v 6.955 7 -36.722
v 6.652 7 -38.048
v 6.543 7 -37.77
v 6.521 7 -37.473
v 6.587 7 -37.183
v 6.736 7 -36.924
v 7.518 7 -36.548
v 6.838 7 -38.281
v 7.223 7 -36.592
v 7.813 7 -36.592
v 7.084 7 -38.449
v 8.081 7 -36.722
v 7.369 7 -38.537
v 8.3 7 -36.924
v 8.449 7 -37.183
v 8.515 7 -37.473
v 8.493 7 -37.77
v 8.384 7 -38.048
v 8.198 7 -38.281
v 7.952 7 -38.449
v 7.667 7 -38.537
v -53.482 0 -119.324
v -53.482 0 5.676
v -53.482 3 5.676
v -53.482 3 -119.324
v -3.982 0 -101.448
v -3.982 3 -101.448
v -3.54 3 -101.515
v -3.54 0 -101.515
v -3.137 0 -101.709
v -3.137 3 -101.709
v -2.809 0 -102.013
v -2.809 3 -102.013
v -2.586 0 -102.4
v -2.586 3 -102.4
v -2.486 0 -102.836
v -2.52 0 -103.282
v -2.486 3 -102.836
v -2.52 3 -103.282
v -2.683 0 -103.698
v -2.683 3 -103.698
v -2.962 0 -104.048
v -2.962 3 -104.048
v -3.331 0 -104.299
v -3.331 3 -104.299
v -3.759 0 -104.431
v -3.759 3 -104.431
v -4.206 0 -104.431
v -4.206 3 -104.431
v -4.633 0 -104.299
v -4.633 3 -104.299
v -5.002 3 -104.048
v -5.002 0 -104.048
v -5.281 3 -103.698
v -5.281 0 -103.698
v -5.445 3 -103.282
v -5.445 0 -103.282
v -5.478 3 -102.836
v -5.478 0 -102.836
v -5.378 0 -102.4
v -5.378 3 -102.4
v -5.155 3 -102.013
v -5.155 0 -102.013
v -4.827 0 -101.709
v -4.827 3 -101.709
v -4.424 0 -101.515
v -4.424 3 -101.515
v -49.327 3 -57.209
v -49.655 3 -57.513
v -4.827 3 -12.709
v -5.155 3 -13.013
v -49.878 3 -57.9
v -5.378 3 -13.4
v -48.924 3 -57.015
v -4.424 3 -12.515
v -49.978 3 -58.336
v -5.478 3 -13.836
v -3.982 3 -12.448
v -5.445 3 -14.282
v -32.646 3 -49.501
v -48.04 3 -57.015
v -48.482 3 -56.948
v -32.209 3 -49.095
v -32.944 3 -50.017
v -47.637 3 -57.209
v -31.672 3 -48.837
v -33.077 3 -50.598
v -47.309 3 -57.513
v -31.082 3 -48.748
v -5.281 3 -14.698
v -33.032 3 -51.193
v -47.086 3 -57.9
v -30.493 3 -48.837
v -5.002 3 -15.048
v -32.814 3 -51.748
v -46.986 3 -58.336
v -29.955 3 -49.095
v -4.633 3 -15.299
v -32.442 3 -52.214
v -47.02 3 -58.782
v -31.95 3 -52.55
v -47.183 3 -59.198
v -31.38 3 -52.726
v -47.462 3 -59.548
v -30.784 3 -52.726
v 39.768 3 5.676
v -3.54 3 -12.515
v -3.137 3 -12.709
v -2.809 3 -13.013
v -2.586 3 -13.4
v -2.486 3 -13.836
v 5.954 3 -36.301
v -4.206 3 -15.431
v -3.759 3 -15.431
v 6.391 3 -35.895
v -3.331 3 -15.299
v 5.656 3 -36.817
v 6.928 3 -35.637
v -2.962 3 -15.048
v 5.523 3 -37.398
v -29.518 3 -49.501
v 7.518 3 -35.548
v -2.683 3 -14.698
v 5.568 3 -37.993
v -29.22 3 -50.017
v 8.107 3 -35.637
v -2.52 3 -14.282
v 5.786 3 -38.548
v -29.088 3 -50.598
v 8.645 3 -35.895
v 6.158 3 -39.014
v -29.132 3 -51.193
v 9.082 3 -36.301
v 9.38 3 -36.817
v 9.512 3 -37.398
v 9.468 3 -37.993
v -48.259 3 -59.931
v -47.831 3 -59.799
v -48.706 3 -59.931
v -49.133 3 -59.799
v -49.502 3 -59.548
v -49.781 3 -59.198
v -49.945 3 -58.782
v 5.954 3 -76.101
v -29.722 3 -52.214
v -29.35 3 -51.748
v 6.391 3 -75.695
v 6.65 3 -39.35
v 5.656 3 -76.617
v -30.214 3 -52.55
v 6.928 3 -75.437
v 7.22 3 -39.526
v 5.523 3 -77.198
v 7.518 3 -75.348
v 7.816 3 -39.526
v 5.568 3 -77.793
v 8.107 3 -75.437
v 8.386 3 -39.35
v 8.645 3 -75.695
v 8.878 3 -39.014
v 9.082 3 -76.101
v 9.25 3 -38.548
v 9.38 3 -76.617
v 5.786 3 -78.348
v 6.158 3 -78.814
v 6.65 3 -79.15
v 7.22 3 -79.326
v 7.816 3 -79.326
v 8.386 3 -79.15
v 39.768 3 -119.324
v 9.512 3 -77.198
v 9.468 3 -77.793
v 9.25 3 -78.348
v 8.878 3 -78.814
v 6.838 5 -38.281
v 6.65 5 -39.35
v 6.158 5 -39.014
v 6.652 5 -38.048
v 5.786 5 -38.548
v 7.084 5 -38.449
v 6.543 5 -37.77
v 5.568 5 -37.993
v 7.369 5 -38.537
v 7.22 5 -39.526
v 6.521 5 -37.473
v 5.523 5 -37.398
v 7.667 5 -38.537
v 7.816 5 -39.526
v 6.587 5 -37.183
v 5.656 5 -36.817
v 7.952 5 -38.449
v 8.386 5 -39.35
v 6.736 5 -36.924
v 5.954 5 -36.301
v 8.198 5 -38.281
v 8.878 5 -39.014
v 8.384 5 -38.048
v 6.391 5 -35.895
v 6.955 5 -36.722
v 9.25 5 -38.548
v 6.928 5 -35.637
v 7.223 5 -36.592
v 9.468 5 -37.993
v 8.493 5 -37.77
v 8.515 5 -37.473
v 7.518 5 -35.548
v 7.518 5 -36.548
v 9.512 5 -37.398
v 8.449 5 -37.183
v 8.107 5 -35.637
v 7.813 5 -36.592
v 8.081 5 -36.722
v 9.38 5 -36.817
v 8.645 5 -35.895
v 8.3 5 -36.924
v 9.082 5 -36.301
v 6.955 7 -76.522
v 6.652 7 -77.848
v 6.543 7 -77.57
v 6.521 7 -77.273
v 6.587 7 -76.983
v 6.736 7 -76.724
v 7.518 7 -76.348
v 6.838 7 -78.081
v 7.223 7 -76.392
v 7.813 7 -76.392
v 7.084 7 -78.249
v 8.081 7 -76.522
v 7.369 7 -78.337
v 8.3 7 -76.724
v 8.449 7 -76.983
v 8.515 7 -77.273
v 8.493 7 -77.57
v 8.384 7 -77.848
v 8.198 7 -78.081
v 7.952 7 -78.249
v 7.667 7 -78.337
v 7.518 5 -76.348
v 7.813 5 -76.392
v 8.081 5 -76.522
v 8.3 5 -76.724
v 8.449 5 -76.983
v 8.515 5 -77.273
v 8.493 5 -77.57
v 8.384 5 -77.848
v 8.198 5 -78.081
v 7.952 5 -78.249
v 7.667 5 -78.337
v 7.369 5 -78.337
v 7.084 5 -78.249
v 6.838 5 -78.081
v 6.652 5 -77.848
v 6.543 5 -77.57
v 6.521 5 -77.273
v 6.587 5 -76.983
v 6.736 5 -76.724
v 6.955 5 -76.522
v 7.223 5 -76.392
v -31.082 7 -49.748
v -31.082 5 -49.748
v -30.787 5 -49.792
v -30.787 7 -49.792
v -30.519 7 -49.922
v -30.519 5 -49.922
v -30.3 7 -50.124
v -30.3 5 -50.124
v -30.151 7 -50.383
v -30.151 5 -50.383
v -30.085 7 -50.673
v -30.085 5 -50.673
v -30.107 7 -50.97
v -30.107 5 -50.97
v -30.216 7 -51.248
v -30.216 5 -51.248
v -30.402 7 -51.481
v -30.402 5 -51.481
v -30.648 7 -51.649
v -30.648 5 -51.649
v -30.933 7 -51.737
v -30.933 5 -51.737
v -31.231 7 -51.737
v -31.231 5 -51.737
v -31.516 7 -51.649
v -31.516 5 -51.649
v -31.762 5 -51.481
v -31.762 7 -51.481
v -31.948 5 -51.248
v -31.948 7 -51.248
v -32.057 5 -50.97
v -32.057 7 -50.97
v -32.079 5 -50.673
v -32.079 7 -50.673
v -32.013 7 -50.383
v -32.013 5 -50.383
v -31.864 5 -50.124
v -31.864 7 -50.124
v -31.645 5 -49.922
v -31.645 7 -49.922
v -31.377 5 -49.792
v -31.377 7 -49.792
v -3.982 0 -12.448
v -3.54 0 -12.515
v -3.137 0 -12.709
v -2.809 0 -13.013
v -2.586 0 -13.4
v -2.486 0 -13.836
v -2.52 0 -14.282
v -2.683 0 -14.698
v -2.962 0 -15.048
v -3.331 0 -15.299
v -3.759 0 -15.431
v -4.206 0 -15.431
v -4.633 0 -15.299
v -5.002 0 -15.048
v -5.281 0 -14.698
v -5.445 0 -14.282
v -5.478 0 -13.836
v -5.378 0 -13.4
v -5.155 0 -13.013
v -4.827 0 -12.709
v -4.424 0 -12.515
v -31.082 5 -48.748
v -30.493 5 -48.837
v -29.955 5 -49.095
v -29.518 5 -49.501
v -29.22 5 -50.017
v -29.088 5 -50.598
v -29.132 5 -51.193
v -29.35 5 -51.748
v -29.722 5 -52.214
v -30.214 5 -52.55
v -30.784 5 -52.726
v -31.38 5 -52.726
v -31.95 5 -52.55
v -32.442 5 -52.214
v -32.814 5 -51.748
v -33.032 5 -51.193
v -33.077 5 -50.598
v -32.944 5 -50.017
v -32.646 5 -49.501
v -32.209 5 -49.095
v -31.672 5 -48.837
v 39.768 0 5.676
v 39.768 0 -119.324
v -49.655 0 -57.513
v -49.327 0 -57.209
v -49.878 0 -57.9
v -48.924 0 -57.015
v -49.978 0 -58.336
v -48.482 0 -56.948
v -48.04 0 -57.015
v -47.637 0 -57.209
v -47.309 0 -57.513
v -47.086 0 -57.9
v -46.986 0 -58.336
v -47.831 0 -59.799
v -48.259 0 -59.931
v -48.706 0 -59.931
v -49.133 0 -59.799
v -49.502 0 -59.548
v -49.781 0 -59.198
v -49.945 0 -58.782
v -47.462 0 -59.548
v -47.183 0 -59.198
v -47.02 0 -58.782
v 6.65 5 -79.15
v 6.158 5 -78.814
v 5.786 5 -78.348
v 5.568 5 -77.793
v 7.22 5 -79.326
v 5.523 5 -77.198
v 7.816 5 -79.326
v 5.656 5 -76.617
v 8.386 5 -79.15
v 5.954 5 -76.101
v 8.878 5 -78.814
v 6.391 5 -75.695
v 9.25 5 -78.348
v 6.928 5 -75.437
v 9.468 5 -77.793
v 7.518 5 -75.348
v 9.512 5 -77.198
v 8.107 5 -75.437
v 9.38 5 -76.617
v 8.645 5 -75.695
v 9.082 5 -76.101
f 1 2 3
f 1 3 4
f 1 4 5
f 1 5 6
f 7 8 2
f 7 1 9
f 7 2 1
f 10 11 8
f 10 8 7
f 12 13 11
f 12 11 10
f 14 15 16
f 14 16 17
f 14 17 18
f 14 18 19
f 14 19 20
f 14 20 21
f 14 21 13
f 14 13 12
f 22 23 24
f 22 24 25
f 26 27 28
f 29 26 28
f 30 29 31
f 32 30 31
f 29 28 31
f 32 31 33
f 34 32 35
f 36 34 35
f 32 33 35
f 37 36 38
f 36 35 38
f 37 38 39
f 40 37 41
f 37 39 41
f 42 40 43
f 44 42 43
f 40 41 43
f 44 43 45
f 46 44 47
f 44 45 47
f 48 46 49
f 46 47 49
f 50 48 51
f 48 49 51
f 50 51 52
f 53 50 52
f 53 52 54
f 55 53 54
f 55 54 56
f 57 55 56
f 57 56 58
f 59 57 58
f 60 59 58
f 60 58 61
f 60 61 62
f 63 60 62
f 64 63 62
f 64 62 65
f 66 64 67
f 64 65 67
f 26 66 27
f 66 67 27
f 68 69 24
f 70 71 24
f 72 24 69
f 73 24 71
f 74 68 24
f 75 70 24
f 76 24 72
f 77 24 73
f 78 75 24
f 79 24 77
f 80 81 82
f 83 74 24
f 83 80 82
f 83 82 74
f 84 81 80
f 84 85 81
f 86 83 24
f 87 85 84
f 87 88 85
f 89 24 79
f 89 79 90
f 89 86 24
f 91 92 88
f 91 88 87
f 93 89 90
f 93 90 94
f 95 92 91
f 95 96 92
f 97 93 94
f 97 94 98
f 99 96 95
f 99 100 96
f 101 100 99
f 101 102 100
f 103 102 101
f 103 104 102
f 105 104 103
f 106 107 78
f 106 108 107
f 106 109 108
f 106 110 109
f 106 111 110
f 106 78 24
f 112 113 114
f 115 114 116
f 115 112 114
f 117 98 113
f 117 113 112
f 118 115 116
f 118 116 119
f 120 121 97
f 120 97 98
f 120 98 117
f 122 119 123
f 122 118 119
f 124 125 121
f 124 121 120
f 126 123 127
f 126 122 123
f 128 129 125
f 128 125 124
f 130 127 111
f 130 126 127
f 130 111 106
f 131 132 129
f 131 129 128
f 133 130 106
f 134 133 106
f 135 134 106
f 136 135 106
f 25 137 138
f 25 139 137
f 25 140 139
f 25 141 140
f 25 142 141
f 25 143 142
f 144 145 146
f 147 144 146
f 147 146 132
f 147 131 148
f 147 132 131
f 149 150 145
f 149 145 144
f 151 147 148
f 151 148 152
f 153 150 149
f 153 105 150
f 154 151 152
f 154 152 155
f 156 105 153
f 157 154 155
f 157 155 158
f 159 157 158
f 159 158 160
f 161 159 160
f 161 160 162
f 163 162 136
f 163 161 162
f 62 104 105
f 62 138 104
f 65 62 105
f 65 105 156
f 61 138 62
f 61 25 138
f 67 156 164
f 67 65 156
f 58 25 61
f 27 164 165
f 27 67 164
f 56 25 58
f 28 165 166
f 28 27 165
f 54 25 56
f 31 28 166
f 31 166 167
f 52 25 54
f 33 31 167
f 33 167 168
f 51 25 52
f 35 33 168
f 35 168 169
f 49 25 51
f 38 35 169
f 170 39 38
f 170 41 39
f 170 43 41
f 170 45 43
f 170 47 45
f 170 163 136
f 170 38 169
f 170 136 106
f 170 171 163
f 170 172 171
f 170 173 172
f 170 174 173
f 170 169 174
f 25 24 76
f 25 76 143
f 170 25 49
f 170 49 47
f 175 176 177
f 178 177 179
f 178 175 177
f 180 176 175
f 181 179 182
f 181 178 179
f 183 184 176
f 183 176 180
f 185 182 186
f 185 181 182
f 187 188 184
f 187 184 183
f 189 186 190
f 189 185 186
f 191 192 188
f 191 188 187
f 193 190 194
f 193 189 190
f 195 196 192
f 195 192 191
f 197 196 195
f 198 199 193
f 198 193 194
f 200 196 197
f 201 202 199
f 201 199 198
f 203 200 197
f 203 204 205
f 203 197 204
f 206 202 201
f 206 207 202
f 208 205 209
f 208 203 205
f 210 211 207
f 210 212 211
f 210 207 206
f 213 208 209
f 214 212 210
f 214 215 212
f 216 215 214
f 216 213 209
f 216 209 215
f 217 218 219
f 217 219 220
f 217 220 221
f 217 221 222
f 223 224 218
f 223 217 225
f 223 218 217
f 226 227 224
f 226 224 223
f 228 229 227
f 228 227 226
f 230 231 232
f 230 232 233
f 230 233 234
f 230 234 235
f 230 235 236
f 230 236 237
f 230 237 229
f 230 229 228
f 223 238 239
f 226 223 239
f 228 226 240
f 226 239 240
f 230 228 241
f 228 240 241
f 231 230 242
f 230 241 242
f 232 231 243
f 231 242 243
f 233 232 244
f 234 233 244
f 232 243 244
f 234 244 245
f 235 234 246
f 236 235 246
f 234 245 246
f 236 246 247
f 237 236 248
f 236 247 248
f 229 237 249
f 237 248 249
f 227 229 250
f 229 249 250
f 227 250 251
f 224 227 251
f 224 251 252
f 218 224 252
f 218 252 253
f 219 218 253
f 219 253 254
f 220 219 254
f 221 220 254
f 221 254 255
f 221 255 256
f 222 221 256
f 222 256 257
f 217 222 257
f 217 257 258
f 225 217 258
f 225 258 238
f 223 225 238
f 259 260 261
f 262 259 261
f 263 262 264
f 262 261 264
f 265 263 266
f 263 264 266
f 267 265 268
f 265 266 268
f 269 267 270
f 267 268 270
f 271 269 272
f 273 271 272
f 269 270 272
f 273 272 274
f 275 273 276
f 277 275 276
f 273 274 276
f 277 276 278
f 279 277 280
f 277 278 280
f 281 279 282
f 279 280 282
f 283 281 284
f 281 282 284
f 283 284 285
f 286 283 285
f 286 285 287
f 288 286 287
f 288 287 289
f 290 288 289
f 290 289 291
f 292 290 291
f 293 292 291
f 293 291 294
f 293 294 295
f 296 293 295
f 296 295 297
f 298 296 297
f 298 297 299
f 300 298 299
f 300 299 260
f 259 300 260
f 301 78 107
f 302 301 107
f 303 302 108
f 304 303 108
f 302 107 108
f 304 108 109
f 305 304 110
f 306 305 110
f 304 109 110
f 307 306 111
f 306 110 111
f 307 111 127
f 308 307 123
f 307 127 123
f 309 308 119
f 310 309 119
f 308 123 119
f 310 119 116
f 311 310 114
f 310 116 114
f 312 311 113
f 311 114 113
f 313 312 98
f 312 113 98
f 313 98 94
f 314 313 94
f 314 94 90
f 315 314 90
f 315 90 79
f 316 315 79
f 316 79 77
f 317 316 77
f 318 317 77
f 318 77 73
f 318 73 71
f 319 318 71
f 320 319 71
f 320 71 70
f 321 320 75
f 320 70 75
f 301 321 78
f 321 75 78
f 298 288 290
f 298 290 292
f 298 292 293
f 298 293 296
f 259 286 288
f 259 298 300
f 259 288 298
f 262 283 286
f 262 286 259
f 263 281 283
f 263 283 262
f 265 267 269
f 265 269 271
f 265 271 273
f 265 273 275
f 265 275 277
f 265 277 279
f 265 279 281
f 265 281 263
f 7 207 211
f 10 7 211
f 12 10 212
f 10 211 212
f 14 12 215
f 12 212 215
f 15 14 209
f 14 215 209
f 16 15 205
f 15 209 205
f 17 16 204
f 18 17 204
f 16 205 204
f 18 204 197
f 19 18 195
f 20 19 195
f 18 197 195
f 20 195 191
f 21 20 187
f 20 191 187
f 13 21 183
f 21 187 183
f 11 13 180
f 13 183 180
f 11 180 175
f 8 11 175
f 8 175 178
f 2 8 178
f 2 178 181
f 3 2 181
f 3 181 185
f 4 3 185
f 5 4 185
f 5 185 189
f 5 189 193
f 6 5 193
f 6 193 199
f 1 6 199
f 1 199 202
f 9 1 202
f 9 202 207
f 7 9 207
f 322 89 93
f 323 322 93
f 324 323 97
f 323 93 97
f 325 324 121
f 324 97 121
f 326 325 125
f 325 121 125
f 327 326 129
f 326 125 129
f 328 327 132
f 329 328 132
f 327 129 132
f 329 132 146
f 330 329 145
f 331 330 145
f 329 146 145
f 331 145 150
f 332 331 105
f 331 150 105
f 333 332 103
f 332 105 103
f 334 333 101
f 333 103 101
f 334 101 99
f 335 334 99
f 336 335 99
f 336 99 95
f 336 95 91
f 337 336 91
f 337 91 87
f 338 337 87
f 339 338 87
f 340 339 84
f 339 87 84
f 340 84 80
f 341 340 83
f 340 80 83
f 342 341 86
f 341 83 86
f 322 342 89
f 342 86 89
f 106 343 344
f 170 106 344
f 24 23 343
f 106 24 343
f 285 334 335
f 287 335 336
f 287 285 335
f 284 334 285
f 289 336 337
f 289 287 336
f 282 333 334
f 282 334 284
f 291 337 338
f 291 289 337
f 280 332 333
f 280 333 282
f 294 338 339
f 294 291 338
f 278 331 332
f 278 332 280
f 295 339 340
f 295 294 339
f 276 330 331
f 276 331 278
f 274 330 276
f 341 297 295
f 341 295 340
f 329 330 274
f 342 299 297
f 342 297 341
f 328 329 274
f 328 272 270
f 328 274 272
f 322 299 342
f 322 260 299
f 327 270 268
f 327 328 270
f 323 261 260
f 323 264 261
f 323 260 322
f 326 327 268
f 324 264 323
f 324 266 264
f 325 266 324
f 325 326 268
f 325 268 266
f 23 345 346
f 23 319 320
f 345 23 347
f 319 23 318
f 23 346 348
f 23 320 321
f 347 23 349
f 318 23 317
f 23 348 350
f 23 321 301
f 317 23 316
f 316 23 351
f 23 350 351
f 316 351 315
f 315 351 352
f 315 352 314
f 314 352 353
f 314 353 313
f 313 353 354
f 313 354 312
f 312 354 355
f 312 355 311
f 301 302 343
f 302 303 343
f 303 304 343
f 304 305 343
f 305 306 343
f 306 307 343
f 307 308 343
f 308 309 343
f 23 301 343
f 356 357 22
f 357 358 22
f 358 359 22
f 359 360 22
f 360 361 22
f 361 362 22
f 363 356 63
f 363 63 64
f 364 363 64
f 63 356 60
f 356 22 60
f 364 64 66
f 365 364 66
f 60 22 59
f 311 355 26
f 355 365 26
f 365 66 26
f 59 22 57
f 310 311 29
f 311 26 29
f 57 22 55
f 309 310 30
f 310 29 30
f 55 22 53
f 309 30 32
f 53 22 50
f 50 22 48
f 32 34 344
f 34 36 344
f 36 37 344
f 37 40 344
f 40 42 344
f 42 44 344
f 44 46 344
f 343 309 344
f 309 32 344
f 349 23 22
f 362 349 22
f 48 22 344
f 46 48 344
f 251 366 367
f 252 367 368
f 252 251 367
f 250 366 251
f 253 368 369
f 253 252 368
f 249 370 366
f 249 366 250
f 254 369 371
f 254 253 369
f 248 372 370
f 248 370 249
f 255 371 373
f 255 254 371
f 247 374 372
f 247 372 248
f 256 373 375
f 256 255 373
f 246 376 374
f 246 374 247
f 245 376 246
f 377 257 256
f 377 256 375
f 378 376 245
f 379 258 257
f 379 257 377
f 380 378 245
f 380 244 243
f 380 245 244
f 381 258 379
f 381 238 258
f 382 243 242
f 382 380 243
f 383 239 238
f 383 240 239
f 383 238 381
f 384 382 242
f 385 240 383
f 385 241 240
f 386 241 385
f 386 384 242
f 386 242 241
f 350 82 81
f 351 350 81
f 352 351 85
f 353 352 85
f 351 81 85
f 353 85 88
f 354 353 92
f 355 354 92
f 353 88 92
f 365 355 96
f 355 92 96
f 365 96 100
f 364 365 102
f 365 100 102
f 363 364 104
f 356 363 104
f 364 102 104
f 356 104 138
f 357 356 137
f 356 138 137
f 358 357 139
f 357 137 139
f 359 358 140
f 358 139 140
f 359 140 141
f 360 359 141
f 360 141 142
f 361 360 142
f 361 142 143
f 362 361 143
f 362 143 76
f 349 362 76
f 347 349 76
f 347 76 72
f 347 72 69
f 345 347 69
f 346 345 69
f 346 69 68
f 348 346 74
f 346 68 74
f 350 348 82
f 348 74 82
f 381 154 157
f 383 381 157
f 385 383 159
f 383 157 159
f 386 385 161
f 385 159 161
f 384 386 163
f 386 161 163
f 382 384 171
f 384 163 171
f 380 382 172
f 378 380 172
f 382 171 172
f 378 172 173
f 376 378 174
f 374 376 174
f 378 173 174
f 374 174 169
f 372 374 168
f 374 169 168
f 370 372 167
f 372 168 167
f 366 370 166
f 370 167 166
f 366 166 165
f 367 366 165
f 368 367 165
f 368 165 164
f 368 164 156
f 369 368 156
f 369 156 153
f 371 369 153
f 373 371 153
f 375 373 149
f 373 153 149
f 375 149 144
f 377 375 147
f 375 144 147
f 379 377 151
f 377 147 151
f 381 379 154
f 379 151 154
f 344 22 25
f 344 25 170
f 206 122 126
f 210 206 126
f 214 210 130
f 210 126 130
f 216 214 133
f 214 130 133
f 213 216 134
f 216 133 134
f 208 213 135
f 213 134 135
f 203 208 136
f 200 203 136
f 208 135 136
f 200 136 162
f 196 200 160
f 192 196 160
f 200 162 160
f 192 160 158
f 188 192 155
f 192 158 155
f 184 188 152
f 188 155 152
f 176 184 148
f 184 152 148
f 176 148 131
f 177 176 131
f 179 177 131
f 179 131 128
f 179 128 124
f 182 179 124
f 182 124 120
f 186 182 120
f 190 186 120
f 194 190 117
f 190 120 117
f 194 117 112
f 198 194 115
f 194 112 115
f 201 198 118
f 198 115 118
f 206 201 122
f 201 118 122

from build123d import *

# Parameters (mm, degrees)
SKETCH1_W           = 93.25
SKETCH1_H           = 125
BOSS_EXTRUDE1_DEPTH = 3
SKETCH3_R           = 1.5
CUT_EXTRUDE1_DEPTH  = 3
SKETCH4_R           = 2
SKETCH4_R_2         = 1
BOSS_EXTRUDE2_DEPTH = 2
SKETCH6_R           = 1
BOSS_EXTRUDE3_DEPTH = 4


with BuildPart() as part:
    # Sketch1 → Boss-Extrude1 (new body)
    with BuildSketch(Plane(origin=(0, 0, 0), x_dir=(1, 0, 0), z_dir=(0, 1, 0))):
        with Locations((-6.857134593, 56.824464746)):
            Rectangle(SKETCH1_W, SKETCH1_H)
    extrude(amount=BOSS_EXTRUDE1_DEPTH)

    # Sketch3 → Cut-Extrude1 (cut)
    with BuildSketch(Plane(origin=(0, 3, 0), x_dir=(1, 0, 0), z_dir=(0, 1, 0))):
        with Locations(Location((-3.982134593, 102.947941071, 0), (0, 0, 270))):
            Circle(SKETCH3_R)
    cut_extrude1 = extrude(amount=-CUT_EXTRUDE1_DEPTH, mode=Mode.SUBTRACT)

    # Sketch-Pattern1: Cut-Extrude1 at 2 more places
    with Locations((0, 0, 89), (-44.5, 0, 44.5)):
        add(cut_extrude1, mode=Mode.SUBTRACT)

    # Sketch4 → Boss-Extrude2 (add)
    with BuildSketch(Plane(origin=(0, 3, 0), x_dir=(1, 0, 0), z_dir=(0, 1, 0))):
        with Locations(Location((-31.082134593, 50.747941071, 0), (0, 0, 270))):
            Circle(SKETCH4_R)
        with Locations(Location((-31.082134593, 50.747941071, 0), (0, 0, 270))):
            Circle(SKETCH4_R_2, mode=Mode.SUBTRACT)
    boss_extrude2 = extrude(amount=BOSS_EXTRUDE2_DEPTH)

    # Sketch6 → Boss-Extrude3 (add)
    with BuildSketch(Plane(origin=(0, 3, 0), x_dir=(1, 0, 0), z_dir=(0, 1, 0))):
        with Locations(Location((-31.082134593, 50.747941071, 0), (0, 0, 270))):
            Circle(SKETCH6_R)
    boss_extrude3 = extrude(amount=BOSS_EXTRUDE3_DEPTH)

    # Sketch-Pattern2: Boss-Extrude2, Boss-Extrude3 at 2 more places
    with Locations((38.6, 0, -26.6), (38.6, 0, 13.2)):
        add(boss_extrude2)
        add(boss_extrude3)


solid = part.part
